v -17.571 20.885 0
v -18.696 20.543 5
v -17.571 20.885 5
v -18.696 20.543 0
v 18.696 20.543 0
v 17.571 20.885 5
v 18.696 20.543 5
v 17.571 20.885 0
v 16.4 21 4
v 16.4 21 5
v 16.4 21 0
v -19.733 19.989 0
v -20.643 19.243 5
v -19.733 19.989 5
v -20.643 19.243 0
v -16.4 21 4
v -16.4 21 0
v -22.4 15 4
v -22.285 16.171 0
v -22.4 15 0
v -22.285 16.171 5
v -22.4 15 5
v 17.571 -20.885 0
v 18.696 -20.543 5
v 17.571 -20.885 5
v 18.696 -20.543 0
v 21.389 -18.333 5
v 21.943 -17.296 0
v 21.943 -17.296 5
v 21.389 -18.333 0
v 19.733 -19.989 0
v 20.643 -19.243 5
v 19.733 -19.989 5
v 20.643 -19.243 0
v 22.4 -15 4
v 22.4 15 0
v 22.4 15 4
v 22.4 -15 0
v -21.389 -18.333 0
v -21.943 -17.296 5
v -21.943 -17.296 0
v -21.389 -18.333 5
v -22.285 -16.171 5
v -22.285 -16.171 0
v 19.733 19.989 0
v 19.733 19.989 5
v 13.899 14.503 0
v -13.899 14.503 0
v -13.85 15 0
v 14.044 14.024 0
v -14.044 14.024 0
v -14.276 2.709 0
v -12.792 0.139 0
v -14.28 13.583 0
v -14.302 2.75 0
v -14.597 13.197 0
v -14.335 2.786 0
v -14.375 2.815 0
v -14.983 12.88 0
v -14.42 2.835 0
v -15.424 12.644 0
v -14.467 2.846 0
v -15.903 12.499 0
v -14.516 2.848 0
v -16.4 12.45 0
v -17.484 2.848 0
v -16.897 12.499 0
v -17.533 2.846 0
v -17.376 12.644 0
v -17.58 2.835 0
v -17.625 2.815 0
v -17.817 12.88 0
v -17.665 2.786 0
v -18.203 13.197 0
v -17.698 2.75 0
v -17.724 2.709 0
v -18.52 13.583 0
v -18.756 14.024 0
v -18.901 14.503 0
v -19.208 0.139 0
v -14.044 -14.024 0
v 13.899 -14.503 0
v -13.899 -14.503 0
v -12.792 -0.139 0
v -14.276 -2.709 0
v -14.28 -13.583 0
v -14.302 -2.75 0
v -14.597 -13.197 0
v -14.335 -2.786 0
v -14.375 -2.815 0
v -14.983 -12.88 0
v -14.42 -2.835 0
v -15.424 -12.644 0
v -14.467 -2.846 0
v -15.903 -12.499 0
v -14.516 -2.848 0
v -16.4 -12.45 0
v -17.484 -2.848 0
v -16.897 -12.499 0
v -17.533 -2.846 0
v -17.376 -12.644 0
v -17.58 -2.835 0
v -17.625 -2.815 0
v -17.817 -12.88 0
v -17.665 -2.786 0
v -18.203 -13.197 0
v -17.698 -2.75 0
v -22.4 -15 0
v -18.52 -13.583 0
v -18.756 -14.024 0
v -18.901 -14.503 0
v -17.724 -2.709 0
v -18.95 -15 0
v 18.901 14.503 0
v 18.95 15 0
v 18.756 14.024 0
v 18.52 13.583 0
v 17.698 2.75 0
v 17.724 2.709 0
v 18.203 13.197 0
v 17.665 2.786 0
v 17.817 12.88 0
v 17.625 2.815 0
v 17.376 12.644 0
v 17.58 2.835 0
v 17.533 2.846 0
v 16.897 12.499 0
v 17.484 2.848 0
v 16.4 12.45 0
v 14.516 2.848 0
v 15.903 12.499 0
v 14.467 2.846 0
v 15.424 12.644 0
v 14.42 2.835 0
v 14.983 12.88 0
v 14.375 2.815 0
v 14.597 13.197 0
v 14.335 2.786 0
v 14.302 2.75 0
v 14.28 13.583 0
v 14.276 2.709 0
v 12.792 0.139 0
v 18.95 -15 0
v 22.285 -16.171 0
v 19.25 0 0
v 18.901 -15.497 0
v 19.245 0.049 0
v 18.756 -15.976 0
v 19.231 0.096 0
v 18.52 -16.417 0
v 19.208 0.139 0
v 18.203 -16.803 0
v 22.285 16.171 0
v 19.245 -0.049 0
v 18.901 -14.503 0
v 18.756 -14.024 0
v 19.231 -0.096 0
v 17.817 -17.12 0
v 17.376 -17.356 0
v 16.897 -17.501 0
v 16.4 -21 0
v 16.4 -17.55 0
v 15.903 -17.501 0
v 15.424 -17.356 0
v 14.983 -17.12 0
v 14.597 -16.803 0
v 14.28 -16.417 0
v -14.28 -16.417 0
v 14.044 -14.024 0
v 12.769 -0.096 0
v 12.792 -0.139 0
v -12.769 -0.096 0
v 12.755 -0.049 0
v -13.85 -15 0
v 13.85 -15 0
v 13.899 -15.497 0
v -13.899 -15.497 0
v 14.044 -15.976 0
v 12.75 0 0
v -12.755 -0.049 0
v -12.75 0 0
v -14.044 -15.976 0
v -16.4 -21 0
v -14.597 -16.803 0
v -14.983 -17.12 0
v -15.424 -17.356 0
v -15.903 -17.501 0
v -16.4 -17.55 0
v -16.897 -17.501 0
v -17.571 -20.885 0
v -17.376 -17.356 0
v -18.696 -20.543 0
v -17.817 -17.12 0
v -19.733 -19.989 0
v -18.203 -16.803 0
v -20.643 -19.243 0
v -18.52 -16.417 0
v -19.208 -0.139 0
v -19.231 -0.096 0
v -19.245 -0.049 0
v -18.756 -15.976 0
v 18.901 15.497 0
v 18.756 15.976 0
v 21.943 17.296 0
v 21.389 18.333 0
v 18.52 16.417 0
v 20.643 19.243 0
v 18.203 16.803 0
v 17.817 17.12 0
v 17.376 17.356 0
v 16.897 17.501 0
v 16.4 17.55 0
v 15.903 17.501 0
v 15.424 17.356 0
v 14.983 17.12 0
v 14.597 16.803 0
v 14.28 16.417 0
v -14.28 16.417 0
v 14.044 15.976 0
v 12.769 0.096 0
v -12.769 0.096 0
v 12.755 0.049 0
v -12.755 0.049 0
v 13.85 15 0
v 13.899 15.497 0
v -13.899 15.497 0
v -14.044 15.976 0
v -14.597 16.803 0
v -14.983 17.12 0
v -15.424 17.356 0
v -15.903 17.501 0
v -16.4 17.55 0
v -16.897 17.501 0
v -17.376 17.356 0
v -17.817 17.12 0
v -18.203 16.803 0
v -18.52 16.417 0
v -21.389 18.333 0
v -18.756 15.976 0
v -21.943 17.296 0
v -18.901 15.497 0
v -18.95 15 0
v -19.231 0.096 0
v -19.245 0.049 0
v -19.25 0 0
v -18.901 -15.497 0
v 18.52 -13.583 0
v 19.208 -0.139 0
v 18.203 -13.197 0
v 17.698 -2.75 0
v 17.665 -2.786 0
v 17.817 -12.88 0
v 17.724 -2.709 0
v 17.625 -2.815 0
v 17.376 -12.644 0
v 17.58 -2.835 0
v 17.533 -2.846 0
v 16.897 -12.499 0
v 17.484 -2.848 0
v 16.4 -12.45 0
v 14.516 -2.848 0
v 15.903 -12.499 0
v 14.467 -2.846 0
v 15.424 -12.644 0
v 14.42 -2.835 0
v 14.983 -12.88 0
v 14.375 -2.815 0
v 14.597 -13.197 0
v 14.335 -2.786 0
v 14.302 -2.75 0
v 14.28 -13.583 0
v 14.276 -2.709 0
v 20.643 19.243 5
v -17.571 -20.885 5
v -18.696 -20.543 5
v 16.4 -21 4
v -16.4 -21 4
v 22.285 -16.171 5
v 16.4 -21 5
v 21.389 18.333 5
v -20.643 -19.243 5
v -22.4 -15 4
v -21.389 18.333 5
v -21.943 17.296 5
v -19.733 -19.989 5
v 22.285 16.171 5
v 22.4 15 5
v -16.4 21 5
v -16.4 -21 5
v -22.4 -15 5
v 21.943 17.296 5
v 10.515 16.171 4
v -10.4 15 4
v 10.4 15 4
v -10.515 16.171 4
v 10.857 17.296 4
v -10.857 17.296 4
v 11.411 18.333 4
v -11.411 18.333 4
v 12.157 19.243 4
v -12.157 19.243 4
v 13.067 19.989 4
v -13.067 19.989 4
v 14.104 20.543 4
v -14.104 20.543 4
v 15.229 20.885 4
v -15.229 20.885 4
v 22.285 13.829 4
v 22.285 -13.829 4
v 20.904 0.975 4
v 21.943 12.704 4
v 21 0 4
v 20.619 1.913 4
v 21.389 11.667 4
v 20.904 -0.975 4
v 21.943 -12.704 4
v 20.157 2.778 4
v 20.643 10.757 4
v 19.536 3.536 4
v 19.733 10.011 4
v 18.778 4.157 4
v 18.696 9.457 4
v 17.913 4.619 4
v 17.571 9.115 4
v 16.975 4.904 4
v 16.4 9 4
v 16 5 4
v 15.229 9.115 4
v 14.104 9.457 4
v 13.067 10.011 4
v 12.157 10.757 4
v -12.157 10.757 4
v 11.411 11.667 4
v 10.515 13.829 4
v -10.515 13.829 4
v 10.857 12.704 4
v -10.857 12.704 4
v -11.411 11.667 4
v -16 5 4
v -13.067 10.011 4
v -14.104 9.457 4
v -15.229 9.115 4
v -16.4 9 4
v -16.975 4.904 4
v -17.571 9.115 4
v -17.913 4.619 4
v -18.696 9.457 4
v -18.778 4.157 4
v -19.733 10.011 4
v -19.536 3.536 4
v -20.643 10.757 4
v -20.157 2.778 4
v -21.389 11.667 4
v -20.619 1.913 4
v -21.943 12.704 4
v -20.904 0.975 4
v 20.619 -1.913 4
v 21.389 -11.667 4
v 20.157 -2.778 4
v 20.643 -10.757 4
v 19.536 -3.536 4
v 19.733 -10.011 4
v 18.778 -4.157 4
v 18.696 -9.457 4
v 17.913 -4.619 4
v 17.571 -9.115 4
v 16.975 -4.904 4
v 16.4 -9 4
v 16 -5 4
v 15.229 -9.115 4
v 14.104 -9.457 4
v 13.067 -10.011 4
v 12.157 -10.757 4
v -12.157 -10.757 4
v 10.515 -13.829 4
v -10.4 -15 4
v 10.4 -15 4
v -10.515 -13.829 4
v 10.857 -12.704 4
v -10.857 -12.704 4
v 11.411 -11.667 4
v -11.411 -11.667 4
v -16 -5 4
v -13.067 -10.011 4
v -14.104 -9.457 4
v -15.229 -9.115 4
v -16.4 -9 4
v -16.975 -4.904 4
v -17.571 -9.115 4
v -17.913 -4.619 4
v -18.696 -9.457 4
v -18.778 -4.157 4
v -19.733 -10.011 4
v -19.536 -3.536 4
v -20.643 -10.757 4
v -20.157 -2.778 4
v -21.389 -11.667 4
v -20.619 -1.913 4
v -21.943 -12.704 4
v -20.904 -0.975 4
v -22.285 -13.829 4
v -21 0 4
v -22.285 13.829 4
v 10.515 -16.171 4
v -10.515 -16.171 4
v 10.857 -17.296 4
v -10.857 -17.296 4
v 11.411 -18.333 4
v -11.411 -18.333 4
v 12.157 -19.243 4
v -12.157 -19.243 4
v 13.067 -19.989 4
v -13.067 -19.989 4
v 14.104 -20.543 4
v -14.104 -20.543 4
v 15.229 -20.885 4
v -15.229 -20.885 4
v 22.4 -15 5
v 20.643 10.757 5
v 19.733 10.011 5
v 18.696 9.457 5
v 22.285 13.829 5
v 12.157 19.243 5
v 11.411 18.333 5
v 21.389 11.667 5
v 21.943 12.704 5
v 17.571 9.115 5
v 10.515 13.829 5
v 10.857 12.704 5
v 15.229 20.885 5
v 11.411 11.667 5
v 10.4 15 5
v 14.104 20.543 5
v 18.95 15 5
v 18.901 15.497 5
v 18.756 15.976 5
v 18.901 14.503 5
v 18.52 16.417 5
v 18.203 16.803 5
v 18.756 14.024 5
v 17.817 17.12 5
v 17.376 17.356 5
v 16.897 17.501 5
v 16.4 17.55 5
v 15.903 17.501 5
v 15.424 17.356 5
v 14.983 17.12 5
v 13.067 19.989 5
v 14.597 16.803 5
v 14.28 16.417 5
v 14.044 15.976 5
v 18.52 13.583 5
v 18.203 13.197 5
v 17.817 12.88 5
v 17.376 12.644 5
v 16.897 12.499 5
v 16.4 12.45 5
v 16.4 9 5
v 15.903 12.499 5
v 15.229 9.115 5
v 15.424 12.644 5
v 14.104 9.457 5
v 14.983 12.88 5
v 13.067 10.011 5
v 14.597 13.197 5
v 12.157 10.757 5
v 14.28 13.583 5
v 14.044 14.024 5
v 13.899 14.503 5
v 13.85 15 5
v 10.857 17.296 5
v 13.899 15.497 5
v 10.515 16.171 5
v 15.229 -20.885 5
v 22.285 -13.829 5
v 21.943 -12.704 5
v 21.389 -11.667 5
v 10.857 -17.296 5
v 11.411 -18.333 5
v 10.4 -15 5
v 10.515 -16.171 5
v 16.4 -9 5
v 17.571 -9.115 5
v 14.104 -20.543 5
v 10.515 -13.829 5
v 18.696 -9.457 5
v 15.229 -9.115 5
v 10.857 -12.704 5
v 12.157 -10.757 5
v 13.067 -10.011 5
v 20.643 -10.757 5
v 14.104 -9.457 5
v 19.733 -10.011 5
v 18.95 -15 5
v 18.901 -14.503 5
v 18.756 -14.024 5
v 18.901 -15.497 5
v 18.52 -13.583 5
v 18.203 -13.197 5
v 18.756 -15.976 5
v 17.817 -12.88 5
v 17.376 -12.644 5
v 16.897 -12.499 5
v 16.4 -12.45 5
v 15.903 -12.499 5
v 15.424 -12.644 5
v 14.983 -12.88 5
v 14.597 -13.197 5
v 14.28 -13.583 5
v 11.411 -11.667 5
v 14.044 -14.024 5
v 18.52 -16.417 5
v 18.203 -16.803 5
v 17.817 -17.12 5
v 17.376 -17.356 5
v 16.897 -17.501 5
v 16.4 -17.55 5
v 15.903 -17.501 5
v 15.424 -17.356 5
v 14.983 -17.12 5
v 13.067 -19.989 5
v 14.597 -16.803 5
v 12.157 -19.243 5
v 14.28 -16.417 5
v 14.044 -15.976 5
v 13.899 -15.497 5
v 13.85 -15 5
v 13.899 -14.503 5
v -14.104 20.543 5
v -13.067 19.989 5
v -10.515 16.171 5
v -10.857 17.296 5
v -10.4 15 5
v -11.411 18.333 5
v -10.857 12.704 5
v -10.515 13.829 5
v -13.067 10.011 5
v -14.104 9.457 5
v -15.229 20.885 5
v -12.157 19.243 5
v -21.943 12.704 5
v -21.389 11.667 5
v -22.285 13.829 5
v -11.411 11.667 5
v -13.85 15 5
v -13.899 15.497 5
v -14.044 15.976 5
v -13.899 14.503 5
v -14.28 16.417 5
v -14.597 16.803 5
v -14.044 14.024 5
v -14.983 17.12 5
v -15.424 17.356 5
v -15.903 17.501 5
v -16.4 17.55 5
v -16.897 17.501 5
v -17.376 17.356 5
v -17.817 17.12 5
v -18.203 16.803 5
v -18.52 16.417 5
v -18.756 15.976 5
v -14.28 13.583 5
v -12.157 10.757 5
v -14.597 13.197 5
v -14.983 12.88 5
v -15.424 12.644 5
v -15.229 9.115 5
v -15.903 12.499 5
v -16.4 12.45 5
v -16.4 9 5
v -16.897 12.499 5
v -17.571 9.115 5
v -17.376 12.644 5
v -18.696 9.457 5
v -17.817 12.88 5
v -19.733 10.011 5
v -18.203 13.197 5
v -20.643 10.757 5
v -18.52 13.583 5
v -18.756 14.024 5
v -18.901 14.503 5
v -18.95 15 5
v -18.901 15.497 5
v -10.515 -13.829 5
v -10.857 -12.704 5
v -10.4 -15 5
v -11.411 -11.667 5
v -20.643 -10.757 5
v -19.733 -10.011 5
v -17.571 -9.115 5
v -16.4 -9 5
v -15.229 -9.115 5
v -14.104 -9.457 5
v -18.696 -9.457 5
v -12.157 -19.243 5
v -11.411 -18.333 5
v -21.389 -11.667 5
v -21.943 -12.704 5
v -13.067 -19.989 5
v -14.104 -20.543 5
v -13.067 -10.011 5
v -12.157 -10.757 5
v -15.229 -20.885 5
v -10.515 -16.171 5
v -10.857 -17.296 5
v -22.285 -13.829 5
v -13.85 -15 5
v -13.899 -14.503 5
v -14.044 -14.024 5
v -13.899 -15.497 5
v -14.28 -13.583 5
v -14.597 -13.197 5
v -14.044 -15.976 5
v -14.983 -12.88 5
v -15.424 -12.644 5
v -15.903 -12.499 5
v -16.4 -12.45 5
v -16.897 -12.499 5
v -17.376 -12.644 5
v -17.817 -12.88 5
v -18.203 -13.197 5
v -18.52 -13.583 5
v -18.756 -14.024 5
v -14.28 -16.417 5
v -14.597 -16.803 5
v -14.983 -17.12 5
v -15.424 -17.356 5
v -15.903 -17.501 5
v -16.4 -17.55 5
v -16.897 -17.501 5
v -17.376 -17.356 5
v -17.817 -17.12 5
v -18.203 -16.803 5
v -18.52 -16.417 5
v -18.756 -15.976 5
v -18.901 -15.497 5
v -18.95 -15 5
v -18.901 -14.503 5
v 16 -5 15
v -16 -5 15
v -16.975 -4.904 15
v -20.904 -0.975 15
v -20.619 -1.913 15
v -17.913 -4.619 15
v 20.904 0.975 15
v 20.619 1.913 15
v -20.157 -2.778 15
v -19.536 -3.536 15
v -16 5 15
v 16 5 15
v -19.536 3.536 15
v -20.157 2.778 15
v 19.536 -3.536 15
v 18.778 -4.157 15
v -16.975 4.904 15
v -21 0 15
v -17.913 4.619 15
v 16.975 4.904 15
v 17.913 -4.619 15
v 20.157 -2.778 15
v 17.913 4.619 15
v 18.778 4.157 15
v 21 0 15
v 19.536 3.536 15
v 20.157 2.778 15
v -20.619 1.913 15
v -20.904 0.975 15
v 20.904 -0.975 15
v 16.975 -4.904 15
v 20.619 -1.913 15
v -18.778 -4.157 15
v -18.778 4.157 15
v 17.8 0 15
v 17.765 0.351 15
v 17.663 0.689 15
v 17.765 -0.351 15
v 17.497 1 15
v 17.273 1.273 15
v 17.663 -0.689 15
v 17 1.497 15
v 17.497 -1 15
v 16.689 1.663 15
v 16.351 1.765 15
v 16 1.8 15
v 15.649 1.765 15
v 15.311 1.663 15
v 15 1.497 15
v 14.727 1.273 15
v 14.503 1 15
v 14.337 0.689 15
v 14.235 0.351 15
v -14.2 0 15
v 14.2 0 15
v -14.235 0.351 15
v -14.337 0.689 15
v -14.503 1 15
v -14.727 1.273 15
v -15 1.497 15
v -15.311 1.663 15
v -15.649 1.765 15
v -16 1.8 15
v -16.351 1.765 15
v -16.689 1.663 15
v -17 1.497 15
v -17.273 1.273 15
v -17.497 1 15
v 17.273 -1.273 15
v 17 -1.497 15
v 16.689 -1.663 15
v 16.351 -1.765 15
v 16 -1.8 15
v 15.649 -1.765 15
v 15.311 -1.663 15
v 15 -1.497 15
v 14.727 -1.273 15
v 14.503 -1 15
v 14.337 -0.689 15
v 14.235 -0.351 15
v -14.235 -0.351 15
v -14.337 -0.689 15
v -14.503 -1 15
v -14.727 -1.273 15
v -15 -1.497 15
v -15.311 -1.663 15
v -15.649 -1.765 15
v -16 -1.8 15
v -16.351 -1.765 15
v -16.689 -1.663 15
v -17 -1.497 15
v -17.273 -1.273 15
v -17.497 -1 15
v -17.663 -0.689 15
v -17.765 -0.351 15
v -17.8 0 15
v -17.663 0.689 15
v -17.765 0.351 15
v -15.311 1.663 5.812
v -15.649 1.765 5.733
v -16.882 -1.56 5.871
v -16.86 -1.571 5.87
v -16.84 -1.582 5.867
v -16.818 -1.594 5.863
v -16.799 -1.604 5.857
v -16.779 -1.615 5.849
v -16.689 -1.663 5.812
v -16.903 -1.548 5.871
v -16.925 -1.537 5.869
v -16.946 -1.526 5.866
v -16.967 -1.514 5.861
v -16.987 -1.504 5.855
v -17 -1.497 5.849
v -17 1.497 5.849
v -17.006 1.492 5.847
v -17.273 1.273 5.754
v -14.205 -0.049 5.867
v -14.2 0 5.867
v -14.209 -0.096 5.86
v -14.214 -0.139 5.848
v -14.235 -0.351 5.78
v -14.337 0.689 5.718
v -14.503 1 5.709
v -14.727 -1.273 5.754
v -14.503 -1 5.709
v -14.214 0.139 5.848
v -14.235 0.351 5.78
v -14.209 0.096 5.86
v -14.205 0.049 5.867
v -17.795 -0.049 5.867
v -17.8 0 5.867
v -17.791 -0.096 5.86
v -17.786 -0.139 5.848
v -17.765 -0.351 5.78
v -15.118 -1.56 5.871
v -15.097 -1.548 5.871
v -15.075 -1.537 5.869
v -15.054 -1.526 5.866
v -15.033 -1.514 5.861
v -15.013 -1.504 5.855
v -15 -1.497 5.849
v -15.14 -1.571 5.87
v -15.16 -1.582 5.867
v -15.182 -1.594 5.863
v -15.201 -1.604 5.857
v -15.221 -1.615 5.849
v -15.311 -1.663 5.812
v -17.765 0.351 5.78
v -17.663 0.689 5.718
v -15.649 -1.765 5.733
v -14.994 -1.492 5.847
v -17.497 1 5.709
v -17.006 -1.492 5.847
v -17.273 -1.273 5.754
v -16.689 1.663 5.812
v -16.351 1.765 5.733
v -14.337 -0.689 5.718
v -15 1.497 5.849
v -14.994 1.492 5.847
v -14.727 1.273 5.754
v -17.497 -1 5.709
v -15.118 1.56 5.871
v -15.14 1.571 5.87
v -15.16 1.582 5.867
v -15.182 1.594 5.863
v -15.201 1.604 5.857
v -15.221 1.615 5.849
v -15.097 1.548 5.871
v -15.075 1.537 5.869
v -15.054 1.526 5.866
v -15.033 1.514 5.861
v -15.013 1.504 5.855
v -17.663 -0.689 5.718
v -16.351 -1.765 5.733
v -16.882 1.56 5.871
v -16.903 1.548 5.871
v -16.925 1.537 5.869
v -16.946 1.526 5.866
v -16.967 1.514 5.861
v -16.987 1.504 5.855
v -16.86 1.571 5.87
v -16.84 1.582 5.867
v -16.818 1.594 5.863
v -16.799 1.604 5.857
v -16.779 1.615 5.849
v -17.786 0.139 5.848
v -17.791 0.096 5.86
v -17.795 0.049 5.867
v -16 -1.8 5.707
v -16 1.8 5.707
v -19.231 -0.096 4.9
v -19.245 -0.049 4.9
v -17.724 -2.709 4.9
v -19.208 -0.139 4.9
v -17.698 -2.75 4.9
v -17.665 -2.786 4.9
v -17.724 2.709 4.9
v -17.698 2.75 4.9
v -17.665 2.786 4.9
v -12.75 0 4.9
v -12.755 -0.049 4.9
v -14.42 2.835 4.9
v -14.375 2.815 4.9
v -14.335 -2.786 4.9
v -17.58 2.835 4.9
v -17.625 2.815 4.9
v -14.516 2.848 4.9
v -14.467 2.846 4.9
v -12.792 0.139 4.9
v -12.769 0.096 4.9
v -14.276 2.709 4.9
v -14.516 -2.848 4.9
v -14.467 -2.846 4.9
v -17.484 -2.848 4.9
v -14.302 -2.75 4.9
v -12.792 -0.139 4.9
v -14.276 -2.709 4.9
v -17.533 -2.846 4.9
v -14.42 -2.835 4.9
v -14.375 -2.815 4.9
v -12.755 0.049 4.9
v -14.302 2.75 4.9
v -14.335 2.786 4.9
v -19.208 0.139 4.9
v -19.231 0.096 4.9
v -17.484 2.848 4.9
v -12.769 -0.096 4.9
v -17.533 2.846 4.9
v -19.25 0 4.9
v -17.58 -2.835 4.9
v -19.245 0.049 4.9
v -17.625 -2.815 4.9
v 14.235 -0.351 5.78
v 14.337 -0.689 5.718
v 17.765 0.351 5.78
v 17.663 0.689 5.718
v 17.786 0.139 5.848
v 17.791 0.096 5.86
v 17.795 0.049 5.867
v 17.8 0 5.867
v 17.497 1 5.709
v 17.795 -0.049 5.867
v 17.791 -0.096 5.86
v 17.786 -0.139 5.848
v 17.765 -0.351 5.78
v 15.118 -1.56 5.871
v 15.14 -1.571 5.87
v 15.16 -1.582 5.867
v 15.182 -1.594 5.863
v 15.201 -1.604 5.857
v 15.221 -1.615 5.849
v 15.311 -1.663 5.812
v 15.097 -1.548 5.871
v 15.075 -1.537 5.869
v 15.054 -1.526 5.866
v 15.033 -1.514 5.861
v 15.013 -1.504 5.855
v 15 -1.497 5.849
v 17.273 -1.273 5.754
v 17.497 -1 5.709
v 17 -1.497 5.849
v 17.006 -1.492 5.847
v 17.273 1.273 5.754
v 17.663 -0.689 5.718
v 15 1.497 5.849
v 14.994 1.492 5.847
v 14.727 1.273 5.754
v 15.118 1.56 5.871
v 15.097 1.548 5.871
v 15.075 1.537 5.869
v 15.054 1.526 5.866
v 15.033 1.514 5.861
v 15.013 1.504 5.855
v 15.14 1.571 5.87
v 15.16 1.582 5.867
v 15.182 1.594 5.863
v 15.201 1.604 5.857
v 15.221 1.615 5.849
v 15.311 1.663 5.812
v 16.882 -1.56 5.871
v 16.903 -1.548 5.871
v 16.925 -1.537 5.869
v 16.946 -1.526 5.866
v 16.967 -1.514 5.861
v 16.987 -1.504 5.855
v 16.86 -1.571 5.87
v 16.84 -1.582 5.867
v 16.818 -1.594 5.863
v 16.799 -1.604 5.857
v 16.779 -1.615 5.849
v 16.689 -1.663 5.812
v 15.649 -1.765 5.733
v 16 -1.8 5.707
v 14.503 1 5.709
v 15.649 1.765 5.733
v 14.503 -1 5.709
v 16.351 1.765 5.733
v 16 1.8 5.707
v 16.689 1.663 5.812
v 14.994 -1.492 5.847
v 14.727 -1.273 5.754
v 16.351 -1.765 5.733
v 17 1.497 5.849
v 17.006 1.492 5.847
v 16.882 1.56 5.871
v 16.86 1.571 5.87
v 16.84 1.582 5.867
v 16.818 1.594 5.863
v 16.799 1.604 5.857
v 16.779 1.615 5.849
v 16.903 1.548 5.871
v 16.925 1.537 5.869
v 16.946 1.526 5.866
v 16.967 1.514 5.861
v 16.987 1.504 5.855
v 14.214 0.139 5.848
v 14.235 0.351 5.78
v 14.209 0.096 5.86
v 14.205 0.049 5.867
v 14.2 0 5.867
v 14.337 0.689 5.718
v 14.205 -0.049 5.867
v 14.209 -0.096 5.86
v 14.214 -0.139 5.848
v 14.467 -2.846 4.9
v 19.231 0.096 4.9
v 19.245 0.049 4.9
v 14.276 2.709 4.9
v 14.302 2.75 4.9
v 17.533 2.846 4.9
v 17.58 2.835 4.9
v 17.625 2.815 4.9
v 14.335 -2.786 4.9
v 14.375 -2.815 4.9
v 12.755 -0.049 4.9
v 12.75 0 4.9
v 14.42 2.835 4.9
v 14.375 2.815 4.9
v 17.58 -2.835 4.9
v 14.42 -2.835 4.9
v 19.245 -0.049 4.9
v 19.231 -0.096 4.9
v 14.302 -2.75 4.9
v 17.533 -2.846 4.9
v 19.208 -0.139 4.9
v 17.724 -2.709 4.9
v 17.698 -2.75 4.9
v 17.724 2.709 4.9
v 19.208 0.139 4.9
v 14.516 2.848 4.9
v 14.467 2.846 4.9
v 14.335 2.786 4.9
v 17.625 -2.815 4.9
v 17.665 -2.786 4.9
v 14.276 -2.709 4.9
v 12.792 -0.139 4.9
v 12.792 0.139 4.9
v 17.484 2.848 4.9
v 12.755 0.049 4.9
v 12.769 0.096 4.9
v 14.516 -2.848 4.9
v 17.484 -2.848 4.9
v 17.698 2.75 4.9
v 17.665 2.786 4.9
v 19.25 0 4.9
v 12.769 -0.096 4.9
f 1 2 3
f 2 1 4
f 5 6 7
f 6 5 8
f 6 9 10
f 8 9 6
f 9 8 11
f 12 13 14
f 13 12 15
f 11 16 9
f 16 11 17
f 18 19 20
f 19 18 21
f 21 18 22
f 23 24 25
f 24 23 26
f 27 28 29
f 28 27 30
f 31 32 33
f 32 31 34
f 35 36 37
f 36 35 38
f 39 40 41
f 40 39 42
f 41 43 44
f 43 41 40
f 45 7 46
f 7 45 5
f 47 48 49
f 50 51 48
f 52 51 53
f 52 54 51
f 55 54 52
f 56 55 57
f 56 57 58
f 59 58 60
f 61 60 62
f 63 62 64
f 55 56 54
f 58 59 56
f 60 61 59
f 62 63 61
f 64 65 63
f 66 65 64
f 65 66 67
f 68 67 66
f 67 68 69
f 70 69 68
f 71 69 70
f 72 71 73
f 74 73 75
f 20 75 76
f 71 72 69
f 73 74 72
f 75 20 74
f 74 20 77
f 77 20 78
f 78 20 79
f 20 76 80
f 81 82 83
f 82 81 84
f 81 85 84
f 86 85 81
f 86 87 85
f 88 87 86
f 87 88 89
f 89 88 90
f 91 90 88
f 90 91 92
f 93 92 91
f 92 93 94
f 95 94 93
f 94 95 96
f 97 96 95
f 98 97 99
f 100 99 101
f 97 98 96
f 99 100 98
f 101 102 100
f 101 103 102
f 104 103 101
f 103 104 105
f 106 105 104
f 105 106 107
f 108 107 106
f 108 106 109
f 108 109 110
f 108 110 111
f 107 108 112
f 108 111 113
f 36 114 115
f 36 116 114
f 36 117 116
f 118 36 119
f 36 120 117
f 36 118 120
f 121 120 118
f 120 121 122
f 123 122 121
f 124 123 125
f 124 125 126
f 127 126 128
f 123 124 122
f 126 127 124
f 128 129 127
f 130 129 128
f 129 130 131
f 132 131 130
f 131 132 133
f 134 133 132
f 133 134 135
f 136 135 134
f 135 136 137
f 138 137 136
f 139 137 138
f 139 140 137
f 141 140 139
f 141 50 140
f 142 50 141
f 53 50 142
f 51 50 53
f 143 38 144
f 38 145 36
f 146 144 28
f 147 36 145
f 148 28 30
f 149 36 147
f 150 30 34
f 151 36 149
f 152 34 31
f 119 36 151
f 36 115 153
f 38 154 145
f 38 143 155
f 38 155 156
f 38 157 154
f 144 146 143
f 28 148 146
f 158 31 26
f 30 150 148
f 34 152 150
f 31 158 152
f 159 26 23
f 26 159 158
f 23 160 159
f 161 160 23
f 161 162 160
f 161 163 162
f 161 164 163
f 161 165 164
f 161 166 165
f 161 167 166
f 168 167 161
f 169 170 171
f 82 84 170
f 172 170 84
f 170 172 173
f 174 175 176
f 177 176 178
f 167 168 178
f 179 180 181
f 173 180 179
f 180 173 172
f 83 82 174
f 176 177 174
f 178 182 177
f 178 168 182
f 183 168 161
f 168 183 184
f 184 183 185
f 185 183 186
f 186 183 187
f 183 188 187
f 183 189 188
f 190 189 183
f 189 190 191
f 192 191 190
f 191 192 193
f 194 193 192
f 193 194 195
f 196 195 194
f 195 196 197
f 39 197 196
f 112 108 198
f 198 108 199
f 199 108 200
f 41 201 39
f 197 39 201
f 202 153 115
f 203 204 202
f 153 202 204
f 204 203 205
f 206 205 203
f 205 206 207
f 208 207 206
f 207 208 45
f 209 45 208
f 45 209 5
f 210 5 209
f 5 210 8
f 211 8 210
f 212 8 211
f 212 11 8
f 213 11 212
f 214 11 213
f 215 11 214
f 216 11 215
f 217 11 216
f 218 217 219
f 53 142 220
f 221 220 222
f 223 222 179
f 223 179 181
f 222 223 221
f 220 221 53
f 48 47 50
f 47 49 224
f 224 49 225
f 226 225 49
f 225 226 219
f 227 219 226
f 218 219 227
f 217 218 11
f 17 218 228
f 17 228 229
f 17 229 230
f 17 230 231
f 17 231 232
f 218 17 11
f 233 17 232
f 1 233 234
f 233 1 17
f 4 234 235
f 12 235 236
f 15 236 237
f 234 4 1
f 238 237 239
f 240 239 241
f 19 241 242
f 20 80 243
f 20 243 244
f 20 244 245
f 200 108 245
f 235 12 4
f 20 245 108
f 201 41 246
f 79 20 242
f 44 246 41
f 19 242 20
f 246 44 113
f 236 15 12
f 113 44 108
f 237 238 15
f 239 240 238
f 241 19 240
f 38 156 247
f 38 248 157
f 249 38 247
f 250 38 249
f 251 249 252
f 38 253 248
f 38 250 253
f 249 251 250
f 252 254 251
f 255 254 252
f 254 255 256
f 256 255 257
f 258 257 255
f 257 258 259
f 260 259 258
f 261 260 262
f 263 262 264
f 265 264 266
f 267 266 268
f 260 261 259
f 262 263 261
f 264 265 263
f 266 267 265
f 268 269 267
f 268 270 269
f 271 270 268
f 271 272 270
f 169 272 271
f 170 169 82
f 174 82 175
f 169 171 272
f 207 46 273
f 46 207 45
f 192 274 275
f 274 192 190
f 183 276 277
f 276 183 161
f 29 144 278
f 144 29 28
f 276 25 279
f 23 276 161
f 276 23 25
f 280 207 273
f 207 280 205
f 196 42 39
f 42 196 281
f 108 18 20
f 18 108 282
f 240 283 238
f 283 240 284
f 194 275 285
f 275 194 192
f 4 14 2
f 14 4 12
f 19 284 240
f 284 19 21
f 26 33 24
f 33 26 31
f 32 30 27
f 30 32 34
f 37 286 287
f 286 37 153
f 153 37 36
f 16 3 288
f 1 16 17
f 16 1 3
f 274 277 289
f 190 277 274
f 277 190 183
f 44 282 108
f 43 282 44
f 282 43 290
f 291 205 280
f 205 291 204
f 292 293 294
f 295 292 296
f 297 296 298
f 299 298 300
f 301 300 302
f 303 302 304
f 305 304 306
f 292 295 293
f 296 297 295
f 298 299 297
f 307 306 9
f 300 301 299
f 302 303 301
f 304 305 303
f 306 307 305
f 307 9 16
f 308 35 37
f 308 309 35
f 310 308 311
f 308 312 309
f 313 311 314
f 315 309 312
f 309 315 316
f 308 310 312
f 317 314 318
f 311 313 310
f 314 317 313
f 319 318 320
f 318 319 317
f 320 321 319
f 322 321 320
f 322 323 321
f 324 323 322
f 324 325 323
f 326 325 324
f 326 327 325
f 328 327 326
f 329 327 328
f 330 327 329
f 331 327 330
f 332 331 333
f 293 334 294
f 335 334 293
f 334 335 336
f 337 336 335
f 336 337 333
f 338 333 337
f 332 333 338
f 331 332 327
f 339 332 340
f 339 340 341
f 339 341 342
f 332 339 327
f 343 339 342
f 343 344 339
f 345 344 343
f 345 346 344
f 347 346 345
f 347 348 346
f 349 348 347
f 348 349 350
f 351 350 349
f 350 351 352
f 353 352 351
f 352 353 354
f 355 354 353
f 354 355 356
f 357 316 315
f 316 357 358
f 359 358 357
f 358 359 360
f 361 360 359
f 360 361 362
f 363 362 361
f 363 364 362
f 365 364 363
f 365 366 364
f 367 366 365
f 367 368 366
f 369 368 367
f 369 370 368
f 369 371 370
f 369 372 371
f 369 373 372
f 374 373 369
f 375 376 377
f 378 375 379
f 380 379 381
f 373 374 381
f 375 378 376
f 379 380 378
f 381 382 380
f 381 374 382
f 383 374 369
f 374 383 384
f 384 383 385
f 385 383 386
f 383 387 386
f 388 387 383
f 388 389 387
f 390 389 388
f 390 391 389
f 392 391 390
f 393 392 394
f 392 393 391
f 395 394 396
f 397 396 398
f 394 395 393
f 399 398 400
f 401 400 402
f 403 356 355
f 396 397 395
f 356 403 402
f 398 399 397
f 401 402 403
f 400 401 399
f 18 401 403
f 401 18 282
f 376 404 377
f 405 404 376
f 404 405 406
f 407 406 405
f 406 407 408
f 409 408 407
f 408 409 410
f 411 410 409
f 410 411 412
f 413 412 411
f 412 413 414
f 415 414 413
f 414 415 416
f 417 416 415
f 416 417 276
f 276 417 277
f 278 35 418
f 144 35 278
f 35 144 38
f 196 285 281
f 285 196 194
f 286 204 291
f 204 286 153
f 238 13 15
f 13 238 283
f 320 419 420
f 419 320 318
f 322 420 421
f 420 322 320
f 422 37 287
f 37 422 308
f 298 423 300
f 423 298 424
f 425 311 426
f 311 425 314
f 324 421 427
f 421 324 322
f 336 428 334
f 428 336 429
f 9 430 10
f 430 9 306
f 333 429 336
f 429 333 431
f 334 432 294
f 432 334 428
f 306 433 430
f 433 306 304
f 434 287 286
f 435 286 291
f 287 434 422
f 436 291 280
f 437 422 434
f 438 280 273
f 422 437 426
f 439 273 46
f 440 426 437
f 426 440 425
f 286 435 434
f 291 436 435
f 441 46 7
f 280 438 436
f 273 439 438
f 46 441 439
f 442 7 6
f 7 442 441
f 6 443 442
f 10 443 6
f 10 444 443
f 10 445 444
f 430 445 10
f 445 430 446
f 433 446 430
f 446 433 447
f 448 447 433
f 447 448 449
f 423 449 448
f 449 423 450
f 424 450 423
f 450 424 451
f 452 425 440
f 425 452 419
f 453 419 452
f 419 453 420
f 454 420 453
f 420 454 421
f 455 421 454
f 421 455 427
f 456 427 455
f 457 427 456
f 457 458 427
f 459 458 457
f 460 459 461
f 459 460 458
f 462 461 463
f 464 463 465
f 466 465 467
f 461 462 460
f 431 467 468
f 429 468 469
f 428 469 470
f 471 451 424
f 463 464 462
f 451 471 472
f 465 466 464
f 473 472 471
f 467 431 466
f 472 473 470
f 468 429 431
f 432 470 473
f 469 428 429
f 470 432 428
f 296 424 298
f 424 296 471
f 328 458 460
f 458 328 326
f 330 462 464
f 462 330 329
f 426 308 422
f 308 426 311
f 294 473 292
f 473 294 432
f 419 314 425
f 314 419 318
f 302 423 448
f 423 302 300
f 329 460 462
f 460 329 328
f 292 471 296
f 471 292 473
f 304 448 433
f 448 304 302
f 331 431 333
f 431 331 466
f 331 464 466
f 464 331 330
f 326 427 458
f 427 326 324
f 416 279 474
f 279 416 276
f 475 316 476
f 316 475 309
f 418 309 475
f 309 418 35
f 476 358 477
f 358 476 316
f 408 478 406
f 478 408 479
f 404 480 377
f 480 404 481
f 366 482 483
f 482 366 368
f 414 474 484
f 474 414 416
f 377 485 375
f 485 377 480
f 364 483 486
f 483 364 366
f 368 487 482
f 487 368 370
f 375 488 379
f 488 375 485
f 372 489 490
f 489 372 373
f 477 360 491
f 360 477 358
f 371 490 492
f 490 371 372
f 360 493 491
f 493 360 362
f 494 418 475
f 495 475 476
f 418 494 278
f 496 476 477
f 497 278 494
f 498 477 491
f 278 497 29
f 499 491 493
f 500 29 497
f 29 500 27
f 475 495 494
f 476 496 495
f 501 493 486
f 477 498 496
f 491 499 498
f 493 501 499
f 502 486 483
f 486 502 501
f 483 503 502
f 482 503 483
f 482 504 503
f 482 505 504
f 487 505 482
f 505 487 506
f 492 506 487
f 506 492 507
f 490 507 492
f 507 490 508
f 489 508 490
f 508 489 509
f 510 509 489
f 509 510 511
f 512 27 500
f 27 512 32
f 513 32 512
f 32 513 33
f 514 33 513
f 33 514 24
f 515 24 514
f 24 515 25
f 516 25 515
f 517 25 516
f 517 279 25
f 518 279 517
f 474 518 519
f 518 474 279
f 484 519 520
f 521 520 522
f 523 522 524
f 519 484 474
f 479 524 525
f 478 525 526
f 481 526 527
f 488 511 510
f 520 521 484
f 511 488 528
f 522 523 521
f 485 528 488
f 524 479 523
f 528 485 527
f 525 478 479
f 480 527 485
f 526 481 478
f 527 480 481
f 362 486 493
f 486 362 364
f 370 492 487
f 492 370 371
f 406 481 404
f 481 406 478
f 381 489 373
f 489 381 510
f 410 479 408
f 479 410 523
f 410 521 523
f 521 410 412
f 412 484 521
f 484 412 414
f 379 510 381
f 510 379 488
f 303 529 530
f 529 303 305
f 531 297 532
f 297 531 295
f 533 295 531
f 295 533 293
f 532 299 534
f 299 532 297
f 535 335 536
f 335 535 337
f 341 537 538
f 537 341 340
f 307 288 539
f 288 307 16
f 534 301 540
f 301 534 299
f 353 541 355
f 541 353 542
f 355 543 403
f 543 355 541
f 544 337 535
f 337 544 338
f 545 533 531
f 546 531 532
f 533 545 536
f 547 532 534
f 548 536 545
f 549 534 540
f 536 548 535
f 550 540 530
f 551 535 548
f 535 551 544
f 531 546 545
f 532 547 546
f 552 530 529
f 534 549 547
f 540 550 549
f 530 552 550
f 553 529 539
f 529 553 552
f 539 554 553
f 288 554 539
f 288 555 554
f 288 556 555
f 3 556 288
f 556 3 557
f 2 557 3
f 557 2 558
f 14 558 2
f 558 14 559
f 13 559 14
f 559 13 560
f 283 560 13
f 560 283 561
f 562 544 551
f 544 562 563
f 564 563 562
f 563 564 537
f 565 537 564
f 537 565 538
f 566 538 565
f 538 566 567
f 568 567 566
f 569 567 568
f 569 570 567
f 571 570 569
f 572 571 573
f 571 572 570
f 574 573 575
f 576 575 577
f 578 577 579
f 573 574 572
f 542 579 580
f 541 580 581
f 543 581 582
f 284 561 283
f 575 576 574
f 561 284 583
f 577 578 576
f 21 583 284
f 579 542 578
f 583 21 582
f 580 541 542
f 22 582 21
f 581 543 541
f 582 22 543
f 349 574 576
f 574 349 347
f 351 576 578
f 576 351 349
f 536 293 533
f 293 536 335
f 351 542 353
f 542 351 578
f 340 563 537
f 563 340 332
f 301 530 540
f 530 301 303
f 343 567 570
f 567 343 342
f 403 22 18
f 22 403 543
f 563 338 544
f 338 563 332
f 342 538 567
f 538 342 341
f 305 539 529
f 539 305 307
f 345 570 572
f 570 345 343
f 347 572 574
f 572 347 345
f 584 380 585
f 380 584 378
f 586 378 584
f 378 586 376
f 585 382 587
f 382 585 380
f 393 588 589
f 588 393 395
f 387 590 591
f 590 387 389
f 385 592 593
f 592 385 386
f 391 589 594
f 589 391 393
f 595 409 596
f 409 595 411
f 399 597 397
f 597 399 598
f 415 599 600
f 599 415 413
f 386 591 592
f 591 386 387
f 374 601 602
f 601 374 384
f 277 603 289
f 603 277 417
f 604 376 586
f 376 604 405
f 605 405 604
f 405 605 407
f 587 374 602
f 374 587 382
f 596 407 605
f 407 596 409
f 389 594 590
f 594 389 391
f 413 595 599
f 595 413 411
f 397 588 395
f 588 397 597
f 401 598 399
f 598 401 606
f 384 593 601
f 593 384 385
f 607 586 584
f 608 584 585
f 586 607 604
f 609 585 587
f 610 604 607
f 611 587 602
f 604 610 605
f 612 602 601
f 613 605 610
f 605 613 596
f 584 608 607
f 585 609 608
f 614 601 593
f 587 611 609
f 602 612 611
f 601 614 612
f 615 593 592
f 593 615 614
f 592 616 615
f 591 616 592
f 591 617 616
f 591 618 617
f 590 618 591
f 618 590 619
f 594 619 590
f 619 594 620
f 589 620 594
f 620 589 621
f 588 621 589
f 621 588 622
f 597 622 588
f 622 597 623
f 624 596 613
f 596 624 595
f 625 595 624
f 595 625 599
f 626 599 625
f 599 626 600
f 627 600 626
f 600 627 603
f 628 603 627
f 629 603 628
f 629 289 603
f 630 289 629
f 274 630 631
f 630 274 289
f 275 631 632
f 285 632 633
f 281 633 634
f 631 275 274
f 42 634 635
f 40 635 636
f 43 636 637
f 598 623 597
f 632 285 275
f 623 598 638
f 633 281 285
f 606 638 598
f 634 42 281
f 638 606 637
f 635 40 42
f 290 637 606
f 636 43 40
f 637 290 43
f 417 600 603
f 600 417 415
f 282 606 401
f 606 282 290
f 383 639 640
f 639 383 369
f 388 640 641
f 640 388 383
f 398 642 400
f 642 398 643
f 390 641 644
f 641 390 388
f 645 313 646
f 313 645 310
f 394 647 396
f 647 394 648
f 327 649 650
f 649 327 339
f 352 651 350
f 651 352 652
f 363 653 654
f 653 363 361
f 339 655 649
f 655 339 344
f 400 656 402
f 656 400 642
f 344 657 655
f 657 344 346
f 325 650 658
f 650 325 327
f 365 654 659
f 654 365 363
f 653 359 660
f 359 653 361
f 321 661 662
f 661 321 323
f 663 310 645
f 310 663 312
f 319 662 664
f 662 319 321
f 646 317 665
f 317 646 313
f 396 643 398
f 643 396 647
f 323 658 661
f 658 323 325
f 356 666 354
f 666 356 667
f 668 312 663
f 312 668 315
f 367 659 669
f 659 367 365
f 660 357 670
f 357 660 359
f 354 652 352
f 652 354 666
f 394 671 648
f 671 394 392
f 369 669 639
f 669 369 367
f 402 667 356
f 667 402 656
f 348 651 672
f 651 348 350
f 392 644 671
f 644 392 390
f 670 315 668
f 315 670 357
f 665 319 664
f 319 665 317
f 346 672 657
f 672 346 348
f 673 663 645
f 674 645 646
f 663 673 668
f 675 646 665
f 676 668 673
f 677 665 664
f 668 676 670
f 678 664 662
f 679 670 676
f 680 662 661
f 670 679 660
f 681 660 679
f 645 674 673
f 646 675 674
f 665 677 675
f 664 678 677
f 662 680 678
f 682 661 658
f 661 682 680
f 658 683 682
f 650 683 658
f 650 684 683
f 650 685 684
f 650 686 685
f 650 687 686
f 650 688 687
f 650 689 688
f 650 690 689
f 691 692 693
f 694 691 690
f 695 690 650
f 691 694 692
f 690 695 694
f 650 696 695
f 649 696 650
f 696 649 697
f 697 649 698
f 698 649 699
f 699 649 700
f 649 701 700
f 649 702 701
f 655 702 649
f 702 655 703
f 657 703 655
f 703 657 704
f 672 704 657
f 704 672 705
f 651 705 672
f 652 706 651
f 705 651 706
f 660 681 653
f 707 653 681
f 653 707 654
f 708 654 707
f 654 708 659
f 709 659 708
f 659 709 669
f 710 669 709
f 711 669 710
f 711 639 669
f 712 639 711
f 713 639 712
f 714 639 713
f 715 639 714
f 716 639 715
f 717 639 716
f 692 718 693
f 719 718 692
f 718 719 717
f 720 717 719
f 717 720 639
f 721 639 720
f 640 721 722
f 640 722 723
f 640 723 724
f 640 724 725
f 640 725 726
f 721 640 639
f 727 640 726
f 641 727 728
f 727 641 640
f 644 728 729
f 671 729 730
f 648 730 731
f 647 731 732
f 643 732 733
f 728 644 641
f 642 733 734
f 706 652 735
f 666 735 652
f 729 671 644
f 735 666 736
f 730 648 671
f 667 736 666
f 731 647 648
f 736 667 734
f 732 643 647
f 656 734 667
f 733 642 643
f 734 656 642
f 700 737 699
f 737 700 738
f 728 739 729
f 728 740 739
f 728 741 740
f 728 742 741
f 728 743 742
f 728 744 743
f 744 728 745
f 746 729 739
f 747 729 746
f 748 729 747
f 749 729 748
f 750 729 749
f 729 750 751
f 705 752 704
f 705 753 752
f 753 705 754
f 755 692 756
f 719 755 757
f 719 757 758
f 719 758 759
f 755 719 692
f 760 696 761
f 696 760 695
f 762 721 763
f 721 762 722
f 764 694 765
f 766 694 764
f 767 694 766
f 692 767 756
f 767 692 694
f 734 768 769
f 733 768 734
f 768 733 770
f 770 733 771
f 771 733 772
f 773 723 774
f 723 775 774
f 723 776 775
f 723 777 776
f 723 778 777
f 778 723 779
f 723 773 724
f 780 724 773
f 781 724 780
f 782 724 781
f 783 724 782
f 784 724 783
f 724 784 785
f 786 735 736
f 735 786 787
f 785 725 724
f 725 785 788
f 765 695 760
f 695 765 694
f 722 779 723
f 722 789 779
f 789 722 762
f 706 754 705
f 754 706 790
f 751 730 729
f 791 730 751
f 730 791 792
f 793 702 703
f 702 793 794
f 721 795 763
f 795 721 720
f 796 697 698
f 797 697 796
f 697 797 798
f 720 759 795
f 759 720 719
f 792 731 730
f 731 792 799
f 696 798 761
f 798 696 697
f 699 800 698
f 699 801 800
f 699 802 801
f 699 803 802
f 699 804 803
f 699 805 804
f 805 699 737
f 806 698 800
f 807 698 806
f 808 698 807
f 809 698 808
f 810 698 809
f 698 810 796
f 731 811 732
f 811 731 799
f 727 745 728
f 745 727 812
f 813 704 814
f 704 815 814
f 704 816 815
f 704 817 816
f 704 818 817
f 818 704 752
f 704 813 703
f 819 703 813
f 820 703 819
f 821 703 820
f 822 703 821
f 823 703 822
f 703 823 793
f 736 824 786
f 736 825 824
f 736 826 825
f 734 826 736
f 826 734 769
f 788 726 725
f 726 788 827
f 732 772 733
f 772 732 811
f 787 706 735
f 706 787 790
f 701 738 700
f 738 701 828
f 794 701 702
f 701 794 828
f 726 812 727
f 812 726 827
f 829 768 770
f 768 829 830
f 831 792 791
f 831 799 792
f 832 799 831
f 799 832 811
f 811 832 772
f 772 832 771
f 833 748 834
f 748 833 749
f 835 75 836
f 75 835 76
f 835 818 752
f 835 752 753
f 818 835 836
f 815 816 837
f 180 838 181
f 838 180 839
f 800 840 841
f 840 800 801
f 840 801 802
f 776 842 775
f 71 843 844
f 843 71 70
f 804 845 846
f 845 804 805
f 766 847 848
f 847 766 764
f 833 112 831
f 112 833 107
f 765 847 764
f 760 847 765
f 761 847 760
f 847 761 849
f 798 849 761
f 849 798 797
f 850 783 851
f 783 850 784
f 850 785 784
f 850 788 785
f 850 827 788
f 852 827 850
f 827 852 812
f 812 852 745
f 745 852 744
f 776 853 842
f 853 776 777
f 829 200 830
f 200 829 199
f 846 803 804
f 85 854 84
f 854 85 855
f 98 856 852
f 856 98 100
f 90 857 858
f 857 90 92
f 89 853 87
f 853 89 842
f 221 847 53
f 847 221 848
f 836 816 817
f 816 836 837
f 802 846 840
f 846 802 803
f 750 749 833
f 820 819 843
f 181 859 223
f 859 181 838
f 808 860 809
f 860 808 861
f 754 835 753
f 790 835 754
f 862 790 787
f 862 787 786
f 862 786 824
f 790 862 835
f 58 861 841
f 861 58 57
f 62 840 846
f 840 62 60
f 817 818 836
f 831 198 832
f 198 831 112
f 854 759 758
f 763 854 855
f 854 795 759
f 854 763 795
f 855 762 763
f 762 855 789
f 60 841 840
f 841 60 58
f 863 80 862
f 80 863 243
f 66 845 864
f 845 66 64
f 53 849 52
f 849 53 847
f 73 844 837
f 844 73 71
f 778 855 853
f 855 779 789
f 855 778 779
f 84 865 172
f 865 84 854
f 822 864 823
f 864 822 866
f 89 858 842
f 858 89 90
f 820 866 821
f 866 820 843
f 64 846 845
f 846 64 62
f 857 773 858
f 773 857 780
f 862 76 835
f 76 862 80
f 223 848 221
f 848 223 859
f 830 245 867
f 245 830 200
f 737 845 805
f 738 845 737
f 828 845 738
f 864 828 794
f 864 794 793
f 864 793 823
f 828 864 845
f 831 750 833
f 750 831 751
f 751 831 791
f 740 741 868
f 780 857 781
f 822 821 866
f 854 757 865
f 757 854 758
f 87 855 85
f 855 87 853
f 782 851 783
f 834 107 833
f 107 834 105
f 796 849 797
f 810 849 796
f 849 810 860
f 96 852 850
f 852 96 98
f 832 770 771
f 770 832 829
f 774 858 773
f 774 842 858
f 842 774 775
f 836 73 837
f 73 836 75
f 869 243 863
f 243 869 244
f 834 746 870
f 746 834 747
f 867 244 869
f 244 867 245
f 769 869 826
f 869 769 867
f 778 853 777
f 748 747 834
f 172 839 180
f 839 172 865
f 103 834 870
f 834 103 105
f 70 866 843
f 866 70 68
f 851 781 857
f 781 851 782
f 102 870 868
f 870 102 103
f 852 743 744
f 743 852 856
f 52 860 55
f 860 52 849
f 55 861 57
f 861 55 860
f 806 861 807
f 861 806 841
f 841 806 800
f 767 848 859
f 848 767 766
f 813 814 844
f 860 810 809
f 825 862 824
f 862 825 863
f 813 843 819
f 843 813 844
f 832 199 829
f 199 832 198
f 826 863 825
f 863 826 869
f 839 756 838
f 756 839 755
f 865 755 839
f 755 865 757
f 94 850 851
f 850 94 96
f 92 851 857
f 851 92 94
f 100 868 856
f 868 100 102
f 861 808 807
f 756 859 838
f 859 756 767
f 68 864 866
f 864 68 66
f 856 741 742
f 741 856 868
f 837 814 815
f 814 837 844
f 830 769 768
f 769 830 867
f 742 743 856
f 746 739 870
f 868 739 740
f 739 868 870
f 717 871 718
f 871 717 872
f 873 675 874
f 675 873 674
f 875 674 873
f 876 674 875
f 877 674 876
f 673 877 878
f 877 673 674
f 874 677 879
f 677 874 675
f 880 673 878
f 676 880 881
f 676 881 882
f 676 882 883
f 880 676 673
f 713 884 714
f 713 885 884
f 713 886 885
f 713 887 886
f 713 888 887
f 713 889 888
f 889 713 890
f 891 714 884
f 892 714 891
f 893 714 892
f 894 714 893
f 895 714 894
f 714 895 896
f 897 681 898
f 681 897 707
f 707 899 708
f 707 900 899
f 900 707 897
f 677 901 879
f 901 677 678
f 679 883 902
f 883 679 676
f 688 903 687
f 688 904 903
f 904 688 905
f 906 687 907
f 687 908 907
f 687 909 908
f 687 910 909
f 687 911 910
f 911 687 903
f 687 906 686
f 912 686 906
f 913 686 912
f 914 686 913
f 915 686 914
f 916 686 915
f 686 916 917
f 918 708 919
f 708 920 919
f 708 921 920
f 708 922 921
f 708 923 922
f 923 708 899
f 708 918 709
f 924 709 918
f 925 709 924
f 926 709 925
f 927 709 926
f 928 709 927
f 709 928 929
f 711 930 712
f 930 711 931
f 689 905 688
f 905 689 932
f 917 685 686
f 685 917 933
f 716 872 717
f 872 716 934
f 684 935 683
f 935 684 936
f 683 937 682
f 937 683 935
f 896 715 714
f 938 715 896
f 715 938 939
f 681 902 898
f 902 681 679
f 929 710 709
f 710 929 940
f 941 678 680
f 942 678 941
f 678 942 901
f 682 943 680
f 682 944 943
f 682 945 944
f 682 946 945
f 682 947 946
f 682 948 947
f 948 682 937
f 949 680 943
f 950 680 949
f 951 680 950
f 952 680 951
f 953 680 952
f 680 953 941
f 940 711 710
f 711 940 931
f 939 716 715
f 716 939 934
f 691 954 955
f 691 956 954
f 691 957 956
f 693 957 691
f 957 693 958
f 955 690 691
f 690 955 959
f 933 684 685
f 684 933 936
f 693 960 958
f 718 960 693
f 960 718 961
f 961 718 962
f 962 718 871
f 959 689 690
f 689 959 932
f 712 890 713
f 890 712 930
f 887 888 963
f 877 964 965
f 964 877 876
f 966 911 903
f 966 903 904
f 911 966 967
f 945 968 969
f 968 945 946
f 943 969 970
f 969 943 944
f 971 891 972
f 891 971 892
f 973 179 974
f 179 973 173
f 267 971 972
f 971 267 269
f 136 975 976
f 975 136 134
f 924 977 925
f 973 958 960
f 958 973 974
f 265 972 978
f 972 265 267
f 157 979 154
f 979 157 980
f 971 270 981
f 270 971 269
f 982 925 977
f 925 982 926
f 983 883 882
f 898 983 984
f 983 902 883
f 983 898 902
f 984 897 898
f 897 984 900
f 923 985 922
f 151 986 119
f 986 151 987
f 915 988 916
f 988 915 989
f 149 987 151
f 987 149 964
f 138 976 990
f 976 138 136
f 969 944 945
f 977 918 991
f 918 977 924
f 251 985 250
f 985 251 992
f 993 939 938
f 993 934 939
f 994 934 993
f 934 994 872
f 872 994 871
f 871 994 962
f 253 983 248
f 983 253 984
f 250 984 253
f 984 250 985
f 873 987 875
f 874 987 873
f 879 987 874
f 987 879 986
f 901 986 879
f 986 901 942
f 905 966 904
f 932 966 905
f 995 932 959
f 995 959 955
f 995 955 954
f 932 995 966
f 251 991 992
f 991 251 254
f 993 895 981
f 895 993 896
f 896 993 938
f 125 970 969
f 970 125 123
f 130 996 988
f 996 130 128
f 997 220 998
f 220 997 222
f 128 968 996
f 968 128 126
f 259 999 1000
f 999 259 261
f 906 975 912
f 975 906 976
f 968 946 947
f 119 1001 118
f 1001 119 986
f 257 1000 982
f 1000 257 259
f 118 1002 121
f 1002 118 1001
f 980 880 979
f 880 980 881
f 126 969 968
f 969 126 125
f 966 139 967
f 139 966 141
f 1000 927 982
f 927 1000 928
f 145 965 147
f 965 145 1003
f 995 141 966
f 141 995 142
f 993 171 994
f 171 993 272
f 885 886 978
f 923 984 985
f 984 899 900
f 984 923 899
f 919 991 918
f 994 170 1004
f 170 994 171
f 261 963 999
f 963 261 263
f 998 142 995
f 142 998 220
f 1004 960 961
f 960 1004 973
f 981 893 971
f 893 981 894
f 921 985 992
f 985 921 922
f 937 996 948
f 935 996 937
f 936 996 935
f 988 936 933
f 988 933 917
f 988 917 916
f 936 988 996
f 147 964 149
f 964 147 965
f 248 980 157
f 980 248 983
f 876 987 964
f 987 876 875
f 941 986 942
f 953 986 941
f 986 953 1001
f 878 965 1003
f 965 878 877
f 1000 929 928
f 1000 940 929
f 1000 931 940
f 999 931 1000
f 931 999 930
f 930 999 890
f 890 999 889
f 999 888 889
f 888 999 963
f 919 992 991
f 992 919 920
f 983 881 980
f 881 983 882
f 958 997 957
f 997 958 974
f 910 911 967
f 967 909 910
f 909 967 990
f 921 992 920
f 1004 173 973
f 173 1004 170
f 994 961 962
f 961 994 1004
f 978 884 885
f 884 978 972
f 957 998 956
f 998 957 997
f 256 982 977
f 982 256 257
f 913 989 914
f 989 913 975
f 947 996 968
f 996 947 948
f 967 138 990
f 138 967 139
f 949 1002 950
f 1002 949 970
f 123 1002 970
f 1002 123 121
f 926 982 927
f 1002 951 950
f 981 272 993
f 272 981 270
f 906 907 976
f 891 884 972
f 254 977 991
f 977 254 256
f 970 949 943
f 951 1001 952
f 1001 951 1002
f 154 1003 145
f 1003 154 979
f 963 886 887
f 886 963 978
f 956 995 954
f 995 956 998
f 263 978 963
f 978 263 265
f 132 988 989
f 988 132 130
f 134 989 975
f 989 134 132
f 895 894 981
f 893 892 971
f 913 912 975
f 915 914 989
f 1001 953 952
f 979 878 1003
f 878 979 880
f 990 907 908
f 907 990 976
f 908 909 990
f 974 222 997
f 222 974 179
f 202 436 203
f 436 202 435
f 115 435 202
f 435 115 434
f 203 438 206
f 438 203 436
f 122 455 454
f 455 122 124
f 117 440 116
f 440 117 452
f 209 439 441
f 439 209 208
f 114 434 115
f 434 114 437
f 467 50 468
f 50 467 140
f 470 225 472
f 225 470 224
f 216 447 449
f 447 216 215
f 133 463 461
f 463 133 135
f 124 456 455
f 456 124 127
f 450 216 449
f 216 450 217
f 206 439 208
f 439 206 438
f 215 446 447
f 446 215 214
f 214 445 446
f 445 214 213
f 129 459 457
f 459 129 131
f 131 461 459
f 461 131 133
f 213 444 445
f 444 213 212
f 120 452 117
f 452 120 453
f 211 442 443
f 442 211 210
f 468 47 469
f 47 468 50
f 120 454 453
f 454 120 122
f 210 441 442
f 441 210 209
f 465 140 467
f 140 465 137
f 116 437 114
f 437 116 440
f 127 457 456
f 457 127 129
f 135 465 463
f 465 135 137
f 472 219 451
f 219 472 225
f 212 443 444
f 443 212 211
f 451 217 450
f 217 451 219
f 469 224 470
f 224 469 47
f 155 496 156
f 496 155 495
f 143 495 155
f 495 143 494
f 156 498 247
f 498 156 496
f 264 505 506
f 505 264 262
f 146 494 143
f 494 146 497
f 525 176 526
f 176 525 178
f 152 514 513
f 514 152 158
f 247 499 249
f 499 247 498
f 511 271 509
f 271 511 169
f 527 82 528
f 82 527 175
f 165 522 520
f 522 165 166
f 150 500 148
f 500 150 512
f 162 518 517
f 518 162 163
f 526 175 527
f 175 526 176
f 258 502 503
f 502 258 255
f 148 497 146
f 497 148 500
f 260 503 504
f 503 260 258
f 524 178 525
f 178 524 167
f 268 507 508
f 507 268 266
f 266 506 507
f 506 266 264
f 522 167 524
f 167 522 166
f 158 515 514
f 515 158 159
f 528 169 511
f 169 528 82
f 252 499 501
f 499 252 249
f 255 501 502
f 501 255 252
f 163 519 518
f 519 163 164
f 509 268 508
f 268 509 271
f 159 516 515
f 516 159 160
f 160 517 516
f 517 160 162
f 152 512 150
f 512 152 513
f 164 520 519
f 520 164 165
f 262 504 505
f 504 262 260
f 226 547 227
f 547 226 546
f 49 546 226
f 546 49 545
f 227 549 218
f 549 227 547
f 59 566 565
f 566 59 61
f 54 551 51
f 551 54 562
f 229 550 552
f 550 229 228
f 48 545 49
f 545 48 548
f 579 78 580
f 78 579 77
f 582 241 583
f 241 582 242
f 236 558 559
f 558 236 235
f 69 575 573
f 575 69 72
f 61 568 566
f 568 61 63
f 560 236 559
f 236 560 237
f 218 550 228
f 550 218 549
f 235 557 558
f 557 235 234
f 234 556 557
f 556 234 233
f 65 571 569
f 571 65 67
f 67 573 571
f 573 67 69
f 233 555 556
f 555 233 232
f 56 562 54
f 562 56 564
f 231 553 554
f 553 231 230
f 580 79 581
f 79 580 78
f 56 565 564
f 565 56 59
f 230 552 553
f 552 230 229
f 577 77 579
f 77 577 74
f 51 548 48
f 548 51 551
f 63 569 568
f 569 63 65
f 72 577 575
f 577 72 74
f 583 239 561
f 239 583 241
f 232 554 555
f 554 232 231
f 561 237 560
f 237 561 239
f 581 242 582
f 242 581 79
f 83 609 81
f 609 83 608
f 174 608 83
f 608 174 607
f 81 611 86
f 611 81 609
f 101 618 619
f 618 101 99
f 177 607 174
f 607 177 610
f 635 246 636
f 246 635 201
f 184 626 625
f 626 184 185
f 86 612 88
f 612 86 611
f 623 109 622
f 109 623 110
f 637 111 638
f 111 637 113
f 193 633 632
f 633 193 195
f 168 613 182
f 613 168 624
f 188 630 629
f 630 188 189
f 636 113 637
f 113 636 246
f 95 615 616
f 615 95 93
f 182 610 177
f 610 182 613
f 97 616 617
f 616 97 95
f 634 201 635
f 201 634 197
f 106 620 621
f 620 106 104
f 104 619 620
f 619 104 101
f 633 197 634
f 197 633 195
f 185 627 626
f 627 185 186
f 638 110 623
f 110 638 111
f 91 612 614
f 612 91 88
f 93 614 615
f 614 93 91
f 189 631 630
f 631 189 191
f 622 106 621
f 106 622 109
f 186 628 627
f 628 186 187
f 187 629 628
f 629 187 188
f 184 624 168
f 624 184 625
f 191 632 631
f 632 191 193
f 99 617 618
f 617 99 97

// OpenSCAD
$fn=32;

D=4;
ll=15;
dd = 16.4;  // EDIT THIS - distance to fit V-wheel to your extrusion
d5=5.2;
d3=3.6;


module nut3() {
    hull() {
        cylinder(d=0.5,h=7);
        translate([3,0,0]) cylinder(d=0.5,h=5);
        rotate([0,0,60]) translate([3,0,0]) cylinder(d=0.5,h=5);
        rotate([0,0,120]) translate([3,0,0]) cylinder(d=0.5,h=5);
        rotate([0,0,180]) translate([3,0,0]) cylinder(d=0.5,h=5);
        rotate([0,0,240]) translate([3,0,0]) cylinder(d=0.5,h=5);
        rotate([0,0,300]) translate([3,0,0]) cylinder(d=0.5,h=5);
    }
}

difference() {
    union() {
        hull() {
            translate([dd,ll,0]) cylinder(d=12,h=D);
            translate([dd,-ll,0]) cylinder(d=12,h=D);
            translate([-dd,ll,0]) cylinder(d=12,h=D);
            translate([-dd,-ll,0]) cylinder(d=12,h=D);
        }
        translate([dd,ll,0]) cylinder(d=12,h=D+1);
        translate([dd,-ll,0]) cylinder(d=12,h=D+1);
        translate([-dd,ll,0]) cylinder(d=12,h=D+1);
        translate([-dd,-ll,0]) cylinder(d=12,h=D+1);
        hull() {
            translate([-16,0,0]) cylinder(d=10,h=15);
            translate([16,0,0]) cylinder(d=10,h=15);
        }
    }
    translate([-16,0,-1]) cylinder(d=d3,h=29);
    translate([-16,0,-0.1]) nut3();
    translate([16,0,-1]) cylinder(d=d3,h=29);
    translate([16,0,-0.1]) nut3();
    translate([dd,ll,-1]) cylinder(d=5.1,h=9);
    translate([dd,-ll,-1]) cylinder(d=5.1,h=9);
    translate([-dd,ll,-1]) cylinder(d=5.1,h=9);
    translate([-dd,-ll,-1]) cylinder(d=5.1,h=9);
}
